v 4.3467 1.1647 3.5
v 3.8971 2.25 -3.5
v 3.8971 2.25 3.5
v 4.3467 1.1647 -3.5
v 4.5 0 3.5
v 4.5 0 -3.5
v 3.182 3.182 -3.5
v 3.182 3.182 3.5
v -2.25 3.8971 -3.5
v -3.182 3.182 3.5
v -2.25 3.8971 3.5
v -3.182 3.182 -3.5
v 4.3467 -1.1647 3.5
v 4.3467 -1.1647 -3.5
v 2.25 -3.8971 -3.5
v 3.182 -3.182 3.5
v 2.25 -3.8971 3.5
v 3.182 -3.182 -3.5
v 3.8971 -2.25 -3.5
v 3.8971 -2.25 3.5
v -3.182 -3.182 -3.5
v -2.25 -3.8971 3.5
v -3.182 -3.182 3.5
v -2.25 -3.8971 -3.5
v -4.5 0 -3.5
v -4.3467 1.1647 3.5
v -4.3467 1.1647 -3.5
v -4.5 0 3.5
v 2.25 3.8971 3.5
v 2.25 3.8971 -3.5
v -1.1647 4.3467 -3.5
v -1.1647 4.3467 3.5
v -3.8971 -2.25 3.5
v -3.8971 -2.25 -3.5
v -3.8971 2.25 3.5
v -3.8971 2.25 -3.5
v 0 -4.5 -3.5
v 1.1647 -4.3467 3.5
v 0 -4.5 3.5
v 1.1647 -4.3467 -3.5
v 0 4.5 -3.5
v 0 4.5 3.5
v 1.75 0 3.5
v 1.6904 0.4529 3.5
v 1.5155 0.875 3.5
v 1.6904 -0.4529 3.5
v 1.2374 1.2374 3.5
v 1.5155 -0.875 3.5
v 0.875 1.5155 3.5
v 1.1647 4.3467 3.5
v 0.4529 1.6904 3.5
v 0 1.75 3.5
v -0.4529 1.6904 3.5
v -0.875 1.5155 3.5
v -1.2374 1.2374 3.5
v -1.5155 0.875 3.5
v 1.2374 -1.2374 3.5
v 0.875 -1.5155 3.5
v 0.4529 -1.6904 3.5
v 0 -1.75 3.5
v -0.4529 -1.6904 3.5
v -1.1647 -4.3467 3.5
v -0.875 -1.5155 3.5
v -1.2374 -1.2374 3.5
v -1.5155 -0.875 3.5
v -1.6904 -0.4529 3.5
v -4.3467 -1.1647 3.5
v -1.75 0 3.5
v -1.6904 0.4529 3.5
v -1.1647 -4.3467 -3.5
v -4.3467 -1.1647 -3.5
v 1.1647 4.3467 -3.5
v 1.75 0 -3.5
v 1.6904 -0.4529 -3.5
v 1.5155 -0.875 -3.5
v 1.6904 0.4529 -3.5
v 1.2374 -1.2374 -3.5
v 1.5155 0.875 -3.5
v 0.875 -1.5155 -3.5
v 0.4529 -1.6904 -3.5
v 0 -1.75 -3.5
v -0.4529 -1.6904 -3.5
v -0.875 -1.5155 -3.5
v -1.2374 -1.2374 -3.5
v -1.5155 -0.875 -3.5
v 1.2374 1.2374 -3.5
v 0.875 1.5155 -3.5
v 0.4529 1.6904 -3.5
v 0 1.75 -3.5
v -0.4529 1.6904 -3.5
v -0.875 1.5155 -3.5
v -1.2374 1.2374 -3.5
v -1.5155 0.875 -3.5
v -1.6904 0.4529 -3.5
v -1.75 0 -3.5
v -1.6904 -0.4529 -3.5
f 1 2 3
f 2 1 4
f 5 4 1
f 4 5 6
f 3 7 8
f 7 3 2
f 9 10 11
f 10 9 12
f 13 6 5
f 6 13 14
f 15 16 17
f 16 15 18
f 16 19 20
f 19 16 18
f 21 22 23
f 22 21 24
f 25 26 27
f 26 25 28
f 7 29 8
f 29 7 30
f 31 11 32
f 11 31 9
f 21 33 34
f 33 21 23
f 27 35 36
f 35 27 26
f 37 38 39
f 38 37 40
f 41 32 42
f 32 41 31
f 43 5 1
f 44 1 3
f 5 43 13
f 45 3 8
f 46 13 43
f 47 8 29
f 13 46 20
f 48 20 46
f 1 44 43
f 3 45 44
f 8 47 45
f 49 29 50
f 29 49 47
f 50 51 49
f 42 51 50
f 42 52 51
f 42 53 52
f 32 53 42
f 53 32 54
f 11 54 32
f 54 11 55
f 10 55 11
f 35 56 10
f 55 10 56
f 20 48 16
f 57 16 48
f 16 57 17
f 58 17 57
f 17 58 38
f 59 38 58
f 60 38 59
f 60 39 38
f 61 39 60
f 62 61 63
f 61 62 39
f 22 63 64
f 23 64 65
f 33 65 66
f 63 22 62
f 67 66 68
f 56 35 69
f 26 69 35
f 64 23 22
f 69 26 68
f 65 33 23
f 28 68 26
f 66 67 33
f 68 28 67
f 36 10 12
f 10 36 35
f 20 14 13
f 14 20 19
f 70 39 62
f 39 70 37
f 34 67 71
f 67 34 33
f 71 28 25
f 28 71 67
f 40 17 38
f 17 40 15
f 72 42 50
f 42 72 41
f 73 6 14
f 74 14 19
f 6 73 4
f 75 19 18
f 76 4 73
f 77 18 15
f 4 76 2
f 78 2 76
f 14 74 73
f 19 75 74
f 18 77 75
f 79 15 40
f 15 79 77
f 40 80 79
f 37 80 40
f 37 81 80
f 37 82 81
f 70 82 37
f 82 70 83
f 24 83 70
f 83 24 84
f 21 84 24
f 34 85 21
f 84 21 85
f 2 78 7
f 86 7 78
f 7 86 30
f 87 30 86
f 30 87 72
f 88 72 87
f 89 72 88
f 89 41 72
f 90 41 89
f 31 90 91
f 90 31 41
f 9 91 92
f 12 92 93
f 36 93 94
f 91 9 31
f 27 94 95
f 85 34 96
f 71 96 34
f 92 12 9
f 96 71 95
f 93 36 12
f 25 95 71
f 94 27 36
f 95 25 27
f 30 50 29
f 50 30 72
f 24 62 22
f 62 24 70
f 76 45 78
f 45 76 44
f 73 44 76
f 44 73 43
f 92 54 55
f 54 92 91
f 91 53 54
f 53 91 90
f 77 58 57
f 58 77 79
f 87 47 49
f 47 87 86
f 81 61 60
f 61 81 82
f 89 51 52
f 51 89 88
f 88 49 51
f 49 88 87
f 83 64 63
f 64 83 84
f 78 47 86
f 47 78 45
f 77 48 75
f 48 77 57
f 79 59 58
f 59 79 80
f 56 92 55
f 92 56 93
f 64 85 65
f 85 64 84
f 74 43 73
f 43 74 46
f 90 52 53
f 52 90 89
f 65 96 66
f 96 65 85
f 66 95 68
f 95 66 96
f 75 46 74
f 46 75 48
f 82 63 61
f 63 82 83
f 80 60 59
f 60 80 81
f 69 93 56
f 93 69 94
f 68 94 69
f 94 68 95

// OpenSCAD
difference()
{
	cylinder(h=7,d=9,center=true,$fn=24);
	cylinder(h=8,d=3.5,center=true,$fn=24);
}
